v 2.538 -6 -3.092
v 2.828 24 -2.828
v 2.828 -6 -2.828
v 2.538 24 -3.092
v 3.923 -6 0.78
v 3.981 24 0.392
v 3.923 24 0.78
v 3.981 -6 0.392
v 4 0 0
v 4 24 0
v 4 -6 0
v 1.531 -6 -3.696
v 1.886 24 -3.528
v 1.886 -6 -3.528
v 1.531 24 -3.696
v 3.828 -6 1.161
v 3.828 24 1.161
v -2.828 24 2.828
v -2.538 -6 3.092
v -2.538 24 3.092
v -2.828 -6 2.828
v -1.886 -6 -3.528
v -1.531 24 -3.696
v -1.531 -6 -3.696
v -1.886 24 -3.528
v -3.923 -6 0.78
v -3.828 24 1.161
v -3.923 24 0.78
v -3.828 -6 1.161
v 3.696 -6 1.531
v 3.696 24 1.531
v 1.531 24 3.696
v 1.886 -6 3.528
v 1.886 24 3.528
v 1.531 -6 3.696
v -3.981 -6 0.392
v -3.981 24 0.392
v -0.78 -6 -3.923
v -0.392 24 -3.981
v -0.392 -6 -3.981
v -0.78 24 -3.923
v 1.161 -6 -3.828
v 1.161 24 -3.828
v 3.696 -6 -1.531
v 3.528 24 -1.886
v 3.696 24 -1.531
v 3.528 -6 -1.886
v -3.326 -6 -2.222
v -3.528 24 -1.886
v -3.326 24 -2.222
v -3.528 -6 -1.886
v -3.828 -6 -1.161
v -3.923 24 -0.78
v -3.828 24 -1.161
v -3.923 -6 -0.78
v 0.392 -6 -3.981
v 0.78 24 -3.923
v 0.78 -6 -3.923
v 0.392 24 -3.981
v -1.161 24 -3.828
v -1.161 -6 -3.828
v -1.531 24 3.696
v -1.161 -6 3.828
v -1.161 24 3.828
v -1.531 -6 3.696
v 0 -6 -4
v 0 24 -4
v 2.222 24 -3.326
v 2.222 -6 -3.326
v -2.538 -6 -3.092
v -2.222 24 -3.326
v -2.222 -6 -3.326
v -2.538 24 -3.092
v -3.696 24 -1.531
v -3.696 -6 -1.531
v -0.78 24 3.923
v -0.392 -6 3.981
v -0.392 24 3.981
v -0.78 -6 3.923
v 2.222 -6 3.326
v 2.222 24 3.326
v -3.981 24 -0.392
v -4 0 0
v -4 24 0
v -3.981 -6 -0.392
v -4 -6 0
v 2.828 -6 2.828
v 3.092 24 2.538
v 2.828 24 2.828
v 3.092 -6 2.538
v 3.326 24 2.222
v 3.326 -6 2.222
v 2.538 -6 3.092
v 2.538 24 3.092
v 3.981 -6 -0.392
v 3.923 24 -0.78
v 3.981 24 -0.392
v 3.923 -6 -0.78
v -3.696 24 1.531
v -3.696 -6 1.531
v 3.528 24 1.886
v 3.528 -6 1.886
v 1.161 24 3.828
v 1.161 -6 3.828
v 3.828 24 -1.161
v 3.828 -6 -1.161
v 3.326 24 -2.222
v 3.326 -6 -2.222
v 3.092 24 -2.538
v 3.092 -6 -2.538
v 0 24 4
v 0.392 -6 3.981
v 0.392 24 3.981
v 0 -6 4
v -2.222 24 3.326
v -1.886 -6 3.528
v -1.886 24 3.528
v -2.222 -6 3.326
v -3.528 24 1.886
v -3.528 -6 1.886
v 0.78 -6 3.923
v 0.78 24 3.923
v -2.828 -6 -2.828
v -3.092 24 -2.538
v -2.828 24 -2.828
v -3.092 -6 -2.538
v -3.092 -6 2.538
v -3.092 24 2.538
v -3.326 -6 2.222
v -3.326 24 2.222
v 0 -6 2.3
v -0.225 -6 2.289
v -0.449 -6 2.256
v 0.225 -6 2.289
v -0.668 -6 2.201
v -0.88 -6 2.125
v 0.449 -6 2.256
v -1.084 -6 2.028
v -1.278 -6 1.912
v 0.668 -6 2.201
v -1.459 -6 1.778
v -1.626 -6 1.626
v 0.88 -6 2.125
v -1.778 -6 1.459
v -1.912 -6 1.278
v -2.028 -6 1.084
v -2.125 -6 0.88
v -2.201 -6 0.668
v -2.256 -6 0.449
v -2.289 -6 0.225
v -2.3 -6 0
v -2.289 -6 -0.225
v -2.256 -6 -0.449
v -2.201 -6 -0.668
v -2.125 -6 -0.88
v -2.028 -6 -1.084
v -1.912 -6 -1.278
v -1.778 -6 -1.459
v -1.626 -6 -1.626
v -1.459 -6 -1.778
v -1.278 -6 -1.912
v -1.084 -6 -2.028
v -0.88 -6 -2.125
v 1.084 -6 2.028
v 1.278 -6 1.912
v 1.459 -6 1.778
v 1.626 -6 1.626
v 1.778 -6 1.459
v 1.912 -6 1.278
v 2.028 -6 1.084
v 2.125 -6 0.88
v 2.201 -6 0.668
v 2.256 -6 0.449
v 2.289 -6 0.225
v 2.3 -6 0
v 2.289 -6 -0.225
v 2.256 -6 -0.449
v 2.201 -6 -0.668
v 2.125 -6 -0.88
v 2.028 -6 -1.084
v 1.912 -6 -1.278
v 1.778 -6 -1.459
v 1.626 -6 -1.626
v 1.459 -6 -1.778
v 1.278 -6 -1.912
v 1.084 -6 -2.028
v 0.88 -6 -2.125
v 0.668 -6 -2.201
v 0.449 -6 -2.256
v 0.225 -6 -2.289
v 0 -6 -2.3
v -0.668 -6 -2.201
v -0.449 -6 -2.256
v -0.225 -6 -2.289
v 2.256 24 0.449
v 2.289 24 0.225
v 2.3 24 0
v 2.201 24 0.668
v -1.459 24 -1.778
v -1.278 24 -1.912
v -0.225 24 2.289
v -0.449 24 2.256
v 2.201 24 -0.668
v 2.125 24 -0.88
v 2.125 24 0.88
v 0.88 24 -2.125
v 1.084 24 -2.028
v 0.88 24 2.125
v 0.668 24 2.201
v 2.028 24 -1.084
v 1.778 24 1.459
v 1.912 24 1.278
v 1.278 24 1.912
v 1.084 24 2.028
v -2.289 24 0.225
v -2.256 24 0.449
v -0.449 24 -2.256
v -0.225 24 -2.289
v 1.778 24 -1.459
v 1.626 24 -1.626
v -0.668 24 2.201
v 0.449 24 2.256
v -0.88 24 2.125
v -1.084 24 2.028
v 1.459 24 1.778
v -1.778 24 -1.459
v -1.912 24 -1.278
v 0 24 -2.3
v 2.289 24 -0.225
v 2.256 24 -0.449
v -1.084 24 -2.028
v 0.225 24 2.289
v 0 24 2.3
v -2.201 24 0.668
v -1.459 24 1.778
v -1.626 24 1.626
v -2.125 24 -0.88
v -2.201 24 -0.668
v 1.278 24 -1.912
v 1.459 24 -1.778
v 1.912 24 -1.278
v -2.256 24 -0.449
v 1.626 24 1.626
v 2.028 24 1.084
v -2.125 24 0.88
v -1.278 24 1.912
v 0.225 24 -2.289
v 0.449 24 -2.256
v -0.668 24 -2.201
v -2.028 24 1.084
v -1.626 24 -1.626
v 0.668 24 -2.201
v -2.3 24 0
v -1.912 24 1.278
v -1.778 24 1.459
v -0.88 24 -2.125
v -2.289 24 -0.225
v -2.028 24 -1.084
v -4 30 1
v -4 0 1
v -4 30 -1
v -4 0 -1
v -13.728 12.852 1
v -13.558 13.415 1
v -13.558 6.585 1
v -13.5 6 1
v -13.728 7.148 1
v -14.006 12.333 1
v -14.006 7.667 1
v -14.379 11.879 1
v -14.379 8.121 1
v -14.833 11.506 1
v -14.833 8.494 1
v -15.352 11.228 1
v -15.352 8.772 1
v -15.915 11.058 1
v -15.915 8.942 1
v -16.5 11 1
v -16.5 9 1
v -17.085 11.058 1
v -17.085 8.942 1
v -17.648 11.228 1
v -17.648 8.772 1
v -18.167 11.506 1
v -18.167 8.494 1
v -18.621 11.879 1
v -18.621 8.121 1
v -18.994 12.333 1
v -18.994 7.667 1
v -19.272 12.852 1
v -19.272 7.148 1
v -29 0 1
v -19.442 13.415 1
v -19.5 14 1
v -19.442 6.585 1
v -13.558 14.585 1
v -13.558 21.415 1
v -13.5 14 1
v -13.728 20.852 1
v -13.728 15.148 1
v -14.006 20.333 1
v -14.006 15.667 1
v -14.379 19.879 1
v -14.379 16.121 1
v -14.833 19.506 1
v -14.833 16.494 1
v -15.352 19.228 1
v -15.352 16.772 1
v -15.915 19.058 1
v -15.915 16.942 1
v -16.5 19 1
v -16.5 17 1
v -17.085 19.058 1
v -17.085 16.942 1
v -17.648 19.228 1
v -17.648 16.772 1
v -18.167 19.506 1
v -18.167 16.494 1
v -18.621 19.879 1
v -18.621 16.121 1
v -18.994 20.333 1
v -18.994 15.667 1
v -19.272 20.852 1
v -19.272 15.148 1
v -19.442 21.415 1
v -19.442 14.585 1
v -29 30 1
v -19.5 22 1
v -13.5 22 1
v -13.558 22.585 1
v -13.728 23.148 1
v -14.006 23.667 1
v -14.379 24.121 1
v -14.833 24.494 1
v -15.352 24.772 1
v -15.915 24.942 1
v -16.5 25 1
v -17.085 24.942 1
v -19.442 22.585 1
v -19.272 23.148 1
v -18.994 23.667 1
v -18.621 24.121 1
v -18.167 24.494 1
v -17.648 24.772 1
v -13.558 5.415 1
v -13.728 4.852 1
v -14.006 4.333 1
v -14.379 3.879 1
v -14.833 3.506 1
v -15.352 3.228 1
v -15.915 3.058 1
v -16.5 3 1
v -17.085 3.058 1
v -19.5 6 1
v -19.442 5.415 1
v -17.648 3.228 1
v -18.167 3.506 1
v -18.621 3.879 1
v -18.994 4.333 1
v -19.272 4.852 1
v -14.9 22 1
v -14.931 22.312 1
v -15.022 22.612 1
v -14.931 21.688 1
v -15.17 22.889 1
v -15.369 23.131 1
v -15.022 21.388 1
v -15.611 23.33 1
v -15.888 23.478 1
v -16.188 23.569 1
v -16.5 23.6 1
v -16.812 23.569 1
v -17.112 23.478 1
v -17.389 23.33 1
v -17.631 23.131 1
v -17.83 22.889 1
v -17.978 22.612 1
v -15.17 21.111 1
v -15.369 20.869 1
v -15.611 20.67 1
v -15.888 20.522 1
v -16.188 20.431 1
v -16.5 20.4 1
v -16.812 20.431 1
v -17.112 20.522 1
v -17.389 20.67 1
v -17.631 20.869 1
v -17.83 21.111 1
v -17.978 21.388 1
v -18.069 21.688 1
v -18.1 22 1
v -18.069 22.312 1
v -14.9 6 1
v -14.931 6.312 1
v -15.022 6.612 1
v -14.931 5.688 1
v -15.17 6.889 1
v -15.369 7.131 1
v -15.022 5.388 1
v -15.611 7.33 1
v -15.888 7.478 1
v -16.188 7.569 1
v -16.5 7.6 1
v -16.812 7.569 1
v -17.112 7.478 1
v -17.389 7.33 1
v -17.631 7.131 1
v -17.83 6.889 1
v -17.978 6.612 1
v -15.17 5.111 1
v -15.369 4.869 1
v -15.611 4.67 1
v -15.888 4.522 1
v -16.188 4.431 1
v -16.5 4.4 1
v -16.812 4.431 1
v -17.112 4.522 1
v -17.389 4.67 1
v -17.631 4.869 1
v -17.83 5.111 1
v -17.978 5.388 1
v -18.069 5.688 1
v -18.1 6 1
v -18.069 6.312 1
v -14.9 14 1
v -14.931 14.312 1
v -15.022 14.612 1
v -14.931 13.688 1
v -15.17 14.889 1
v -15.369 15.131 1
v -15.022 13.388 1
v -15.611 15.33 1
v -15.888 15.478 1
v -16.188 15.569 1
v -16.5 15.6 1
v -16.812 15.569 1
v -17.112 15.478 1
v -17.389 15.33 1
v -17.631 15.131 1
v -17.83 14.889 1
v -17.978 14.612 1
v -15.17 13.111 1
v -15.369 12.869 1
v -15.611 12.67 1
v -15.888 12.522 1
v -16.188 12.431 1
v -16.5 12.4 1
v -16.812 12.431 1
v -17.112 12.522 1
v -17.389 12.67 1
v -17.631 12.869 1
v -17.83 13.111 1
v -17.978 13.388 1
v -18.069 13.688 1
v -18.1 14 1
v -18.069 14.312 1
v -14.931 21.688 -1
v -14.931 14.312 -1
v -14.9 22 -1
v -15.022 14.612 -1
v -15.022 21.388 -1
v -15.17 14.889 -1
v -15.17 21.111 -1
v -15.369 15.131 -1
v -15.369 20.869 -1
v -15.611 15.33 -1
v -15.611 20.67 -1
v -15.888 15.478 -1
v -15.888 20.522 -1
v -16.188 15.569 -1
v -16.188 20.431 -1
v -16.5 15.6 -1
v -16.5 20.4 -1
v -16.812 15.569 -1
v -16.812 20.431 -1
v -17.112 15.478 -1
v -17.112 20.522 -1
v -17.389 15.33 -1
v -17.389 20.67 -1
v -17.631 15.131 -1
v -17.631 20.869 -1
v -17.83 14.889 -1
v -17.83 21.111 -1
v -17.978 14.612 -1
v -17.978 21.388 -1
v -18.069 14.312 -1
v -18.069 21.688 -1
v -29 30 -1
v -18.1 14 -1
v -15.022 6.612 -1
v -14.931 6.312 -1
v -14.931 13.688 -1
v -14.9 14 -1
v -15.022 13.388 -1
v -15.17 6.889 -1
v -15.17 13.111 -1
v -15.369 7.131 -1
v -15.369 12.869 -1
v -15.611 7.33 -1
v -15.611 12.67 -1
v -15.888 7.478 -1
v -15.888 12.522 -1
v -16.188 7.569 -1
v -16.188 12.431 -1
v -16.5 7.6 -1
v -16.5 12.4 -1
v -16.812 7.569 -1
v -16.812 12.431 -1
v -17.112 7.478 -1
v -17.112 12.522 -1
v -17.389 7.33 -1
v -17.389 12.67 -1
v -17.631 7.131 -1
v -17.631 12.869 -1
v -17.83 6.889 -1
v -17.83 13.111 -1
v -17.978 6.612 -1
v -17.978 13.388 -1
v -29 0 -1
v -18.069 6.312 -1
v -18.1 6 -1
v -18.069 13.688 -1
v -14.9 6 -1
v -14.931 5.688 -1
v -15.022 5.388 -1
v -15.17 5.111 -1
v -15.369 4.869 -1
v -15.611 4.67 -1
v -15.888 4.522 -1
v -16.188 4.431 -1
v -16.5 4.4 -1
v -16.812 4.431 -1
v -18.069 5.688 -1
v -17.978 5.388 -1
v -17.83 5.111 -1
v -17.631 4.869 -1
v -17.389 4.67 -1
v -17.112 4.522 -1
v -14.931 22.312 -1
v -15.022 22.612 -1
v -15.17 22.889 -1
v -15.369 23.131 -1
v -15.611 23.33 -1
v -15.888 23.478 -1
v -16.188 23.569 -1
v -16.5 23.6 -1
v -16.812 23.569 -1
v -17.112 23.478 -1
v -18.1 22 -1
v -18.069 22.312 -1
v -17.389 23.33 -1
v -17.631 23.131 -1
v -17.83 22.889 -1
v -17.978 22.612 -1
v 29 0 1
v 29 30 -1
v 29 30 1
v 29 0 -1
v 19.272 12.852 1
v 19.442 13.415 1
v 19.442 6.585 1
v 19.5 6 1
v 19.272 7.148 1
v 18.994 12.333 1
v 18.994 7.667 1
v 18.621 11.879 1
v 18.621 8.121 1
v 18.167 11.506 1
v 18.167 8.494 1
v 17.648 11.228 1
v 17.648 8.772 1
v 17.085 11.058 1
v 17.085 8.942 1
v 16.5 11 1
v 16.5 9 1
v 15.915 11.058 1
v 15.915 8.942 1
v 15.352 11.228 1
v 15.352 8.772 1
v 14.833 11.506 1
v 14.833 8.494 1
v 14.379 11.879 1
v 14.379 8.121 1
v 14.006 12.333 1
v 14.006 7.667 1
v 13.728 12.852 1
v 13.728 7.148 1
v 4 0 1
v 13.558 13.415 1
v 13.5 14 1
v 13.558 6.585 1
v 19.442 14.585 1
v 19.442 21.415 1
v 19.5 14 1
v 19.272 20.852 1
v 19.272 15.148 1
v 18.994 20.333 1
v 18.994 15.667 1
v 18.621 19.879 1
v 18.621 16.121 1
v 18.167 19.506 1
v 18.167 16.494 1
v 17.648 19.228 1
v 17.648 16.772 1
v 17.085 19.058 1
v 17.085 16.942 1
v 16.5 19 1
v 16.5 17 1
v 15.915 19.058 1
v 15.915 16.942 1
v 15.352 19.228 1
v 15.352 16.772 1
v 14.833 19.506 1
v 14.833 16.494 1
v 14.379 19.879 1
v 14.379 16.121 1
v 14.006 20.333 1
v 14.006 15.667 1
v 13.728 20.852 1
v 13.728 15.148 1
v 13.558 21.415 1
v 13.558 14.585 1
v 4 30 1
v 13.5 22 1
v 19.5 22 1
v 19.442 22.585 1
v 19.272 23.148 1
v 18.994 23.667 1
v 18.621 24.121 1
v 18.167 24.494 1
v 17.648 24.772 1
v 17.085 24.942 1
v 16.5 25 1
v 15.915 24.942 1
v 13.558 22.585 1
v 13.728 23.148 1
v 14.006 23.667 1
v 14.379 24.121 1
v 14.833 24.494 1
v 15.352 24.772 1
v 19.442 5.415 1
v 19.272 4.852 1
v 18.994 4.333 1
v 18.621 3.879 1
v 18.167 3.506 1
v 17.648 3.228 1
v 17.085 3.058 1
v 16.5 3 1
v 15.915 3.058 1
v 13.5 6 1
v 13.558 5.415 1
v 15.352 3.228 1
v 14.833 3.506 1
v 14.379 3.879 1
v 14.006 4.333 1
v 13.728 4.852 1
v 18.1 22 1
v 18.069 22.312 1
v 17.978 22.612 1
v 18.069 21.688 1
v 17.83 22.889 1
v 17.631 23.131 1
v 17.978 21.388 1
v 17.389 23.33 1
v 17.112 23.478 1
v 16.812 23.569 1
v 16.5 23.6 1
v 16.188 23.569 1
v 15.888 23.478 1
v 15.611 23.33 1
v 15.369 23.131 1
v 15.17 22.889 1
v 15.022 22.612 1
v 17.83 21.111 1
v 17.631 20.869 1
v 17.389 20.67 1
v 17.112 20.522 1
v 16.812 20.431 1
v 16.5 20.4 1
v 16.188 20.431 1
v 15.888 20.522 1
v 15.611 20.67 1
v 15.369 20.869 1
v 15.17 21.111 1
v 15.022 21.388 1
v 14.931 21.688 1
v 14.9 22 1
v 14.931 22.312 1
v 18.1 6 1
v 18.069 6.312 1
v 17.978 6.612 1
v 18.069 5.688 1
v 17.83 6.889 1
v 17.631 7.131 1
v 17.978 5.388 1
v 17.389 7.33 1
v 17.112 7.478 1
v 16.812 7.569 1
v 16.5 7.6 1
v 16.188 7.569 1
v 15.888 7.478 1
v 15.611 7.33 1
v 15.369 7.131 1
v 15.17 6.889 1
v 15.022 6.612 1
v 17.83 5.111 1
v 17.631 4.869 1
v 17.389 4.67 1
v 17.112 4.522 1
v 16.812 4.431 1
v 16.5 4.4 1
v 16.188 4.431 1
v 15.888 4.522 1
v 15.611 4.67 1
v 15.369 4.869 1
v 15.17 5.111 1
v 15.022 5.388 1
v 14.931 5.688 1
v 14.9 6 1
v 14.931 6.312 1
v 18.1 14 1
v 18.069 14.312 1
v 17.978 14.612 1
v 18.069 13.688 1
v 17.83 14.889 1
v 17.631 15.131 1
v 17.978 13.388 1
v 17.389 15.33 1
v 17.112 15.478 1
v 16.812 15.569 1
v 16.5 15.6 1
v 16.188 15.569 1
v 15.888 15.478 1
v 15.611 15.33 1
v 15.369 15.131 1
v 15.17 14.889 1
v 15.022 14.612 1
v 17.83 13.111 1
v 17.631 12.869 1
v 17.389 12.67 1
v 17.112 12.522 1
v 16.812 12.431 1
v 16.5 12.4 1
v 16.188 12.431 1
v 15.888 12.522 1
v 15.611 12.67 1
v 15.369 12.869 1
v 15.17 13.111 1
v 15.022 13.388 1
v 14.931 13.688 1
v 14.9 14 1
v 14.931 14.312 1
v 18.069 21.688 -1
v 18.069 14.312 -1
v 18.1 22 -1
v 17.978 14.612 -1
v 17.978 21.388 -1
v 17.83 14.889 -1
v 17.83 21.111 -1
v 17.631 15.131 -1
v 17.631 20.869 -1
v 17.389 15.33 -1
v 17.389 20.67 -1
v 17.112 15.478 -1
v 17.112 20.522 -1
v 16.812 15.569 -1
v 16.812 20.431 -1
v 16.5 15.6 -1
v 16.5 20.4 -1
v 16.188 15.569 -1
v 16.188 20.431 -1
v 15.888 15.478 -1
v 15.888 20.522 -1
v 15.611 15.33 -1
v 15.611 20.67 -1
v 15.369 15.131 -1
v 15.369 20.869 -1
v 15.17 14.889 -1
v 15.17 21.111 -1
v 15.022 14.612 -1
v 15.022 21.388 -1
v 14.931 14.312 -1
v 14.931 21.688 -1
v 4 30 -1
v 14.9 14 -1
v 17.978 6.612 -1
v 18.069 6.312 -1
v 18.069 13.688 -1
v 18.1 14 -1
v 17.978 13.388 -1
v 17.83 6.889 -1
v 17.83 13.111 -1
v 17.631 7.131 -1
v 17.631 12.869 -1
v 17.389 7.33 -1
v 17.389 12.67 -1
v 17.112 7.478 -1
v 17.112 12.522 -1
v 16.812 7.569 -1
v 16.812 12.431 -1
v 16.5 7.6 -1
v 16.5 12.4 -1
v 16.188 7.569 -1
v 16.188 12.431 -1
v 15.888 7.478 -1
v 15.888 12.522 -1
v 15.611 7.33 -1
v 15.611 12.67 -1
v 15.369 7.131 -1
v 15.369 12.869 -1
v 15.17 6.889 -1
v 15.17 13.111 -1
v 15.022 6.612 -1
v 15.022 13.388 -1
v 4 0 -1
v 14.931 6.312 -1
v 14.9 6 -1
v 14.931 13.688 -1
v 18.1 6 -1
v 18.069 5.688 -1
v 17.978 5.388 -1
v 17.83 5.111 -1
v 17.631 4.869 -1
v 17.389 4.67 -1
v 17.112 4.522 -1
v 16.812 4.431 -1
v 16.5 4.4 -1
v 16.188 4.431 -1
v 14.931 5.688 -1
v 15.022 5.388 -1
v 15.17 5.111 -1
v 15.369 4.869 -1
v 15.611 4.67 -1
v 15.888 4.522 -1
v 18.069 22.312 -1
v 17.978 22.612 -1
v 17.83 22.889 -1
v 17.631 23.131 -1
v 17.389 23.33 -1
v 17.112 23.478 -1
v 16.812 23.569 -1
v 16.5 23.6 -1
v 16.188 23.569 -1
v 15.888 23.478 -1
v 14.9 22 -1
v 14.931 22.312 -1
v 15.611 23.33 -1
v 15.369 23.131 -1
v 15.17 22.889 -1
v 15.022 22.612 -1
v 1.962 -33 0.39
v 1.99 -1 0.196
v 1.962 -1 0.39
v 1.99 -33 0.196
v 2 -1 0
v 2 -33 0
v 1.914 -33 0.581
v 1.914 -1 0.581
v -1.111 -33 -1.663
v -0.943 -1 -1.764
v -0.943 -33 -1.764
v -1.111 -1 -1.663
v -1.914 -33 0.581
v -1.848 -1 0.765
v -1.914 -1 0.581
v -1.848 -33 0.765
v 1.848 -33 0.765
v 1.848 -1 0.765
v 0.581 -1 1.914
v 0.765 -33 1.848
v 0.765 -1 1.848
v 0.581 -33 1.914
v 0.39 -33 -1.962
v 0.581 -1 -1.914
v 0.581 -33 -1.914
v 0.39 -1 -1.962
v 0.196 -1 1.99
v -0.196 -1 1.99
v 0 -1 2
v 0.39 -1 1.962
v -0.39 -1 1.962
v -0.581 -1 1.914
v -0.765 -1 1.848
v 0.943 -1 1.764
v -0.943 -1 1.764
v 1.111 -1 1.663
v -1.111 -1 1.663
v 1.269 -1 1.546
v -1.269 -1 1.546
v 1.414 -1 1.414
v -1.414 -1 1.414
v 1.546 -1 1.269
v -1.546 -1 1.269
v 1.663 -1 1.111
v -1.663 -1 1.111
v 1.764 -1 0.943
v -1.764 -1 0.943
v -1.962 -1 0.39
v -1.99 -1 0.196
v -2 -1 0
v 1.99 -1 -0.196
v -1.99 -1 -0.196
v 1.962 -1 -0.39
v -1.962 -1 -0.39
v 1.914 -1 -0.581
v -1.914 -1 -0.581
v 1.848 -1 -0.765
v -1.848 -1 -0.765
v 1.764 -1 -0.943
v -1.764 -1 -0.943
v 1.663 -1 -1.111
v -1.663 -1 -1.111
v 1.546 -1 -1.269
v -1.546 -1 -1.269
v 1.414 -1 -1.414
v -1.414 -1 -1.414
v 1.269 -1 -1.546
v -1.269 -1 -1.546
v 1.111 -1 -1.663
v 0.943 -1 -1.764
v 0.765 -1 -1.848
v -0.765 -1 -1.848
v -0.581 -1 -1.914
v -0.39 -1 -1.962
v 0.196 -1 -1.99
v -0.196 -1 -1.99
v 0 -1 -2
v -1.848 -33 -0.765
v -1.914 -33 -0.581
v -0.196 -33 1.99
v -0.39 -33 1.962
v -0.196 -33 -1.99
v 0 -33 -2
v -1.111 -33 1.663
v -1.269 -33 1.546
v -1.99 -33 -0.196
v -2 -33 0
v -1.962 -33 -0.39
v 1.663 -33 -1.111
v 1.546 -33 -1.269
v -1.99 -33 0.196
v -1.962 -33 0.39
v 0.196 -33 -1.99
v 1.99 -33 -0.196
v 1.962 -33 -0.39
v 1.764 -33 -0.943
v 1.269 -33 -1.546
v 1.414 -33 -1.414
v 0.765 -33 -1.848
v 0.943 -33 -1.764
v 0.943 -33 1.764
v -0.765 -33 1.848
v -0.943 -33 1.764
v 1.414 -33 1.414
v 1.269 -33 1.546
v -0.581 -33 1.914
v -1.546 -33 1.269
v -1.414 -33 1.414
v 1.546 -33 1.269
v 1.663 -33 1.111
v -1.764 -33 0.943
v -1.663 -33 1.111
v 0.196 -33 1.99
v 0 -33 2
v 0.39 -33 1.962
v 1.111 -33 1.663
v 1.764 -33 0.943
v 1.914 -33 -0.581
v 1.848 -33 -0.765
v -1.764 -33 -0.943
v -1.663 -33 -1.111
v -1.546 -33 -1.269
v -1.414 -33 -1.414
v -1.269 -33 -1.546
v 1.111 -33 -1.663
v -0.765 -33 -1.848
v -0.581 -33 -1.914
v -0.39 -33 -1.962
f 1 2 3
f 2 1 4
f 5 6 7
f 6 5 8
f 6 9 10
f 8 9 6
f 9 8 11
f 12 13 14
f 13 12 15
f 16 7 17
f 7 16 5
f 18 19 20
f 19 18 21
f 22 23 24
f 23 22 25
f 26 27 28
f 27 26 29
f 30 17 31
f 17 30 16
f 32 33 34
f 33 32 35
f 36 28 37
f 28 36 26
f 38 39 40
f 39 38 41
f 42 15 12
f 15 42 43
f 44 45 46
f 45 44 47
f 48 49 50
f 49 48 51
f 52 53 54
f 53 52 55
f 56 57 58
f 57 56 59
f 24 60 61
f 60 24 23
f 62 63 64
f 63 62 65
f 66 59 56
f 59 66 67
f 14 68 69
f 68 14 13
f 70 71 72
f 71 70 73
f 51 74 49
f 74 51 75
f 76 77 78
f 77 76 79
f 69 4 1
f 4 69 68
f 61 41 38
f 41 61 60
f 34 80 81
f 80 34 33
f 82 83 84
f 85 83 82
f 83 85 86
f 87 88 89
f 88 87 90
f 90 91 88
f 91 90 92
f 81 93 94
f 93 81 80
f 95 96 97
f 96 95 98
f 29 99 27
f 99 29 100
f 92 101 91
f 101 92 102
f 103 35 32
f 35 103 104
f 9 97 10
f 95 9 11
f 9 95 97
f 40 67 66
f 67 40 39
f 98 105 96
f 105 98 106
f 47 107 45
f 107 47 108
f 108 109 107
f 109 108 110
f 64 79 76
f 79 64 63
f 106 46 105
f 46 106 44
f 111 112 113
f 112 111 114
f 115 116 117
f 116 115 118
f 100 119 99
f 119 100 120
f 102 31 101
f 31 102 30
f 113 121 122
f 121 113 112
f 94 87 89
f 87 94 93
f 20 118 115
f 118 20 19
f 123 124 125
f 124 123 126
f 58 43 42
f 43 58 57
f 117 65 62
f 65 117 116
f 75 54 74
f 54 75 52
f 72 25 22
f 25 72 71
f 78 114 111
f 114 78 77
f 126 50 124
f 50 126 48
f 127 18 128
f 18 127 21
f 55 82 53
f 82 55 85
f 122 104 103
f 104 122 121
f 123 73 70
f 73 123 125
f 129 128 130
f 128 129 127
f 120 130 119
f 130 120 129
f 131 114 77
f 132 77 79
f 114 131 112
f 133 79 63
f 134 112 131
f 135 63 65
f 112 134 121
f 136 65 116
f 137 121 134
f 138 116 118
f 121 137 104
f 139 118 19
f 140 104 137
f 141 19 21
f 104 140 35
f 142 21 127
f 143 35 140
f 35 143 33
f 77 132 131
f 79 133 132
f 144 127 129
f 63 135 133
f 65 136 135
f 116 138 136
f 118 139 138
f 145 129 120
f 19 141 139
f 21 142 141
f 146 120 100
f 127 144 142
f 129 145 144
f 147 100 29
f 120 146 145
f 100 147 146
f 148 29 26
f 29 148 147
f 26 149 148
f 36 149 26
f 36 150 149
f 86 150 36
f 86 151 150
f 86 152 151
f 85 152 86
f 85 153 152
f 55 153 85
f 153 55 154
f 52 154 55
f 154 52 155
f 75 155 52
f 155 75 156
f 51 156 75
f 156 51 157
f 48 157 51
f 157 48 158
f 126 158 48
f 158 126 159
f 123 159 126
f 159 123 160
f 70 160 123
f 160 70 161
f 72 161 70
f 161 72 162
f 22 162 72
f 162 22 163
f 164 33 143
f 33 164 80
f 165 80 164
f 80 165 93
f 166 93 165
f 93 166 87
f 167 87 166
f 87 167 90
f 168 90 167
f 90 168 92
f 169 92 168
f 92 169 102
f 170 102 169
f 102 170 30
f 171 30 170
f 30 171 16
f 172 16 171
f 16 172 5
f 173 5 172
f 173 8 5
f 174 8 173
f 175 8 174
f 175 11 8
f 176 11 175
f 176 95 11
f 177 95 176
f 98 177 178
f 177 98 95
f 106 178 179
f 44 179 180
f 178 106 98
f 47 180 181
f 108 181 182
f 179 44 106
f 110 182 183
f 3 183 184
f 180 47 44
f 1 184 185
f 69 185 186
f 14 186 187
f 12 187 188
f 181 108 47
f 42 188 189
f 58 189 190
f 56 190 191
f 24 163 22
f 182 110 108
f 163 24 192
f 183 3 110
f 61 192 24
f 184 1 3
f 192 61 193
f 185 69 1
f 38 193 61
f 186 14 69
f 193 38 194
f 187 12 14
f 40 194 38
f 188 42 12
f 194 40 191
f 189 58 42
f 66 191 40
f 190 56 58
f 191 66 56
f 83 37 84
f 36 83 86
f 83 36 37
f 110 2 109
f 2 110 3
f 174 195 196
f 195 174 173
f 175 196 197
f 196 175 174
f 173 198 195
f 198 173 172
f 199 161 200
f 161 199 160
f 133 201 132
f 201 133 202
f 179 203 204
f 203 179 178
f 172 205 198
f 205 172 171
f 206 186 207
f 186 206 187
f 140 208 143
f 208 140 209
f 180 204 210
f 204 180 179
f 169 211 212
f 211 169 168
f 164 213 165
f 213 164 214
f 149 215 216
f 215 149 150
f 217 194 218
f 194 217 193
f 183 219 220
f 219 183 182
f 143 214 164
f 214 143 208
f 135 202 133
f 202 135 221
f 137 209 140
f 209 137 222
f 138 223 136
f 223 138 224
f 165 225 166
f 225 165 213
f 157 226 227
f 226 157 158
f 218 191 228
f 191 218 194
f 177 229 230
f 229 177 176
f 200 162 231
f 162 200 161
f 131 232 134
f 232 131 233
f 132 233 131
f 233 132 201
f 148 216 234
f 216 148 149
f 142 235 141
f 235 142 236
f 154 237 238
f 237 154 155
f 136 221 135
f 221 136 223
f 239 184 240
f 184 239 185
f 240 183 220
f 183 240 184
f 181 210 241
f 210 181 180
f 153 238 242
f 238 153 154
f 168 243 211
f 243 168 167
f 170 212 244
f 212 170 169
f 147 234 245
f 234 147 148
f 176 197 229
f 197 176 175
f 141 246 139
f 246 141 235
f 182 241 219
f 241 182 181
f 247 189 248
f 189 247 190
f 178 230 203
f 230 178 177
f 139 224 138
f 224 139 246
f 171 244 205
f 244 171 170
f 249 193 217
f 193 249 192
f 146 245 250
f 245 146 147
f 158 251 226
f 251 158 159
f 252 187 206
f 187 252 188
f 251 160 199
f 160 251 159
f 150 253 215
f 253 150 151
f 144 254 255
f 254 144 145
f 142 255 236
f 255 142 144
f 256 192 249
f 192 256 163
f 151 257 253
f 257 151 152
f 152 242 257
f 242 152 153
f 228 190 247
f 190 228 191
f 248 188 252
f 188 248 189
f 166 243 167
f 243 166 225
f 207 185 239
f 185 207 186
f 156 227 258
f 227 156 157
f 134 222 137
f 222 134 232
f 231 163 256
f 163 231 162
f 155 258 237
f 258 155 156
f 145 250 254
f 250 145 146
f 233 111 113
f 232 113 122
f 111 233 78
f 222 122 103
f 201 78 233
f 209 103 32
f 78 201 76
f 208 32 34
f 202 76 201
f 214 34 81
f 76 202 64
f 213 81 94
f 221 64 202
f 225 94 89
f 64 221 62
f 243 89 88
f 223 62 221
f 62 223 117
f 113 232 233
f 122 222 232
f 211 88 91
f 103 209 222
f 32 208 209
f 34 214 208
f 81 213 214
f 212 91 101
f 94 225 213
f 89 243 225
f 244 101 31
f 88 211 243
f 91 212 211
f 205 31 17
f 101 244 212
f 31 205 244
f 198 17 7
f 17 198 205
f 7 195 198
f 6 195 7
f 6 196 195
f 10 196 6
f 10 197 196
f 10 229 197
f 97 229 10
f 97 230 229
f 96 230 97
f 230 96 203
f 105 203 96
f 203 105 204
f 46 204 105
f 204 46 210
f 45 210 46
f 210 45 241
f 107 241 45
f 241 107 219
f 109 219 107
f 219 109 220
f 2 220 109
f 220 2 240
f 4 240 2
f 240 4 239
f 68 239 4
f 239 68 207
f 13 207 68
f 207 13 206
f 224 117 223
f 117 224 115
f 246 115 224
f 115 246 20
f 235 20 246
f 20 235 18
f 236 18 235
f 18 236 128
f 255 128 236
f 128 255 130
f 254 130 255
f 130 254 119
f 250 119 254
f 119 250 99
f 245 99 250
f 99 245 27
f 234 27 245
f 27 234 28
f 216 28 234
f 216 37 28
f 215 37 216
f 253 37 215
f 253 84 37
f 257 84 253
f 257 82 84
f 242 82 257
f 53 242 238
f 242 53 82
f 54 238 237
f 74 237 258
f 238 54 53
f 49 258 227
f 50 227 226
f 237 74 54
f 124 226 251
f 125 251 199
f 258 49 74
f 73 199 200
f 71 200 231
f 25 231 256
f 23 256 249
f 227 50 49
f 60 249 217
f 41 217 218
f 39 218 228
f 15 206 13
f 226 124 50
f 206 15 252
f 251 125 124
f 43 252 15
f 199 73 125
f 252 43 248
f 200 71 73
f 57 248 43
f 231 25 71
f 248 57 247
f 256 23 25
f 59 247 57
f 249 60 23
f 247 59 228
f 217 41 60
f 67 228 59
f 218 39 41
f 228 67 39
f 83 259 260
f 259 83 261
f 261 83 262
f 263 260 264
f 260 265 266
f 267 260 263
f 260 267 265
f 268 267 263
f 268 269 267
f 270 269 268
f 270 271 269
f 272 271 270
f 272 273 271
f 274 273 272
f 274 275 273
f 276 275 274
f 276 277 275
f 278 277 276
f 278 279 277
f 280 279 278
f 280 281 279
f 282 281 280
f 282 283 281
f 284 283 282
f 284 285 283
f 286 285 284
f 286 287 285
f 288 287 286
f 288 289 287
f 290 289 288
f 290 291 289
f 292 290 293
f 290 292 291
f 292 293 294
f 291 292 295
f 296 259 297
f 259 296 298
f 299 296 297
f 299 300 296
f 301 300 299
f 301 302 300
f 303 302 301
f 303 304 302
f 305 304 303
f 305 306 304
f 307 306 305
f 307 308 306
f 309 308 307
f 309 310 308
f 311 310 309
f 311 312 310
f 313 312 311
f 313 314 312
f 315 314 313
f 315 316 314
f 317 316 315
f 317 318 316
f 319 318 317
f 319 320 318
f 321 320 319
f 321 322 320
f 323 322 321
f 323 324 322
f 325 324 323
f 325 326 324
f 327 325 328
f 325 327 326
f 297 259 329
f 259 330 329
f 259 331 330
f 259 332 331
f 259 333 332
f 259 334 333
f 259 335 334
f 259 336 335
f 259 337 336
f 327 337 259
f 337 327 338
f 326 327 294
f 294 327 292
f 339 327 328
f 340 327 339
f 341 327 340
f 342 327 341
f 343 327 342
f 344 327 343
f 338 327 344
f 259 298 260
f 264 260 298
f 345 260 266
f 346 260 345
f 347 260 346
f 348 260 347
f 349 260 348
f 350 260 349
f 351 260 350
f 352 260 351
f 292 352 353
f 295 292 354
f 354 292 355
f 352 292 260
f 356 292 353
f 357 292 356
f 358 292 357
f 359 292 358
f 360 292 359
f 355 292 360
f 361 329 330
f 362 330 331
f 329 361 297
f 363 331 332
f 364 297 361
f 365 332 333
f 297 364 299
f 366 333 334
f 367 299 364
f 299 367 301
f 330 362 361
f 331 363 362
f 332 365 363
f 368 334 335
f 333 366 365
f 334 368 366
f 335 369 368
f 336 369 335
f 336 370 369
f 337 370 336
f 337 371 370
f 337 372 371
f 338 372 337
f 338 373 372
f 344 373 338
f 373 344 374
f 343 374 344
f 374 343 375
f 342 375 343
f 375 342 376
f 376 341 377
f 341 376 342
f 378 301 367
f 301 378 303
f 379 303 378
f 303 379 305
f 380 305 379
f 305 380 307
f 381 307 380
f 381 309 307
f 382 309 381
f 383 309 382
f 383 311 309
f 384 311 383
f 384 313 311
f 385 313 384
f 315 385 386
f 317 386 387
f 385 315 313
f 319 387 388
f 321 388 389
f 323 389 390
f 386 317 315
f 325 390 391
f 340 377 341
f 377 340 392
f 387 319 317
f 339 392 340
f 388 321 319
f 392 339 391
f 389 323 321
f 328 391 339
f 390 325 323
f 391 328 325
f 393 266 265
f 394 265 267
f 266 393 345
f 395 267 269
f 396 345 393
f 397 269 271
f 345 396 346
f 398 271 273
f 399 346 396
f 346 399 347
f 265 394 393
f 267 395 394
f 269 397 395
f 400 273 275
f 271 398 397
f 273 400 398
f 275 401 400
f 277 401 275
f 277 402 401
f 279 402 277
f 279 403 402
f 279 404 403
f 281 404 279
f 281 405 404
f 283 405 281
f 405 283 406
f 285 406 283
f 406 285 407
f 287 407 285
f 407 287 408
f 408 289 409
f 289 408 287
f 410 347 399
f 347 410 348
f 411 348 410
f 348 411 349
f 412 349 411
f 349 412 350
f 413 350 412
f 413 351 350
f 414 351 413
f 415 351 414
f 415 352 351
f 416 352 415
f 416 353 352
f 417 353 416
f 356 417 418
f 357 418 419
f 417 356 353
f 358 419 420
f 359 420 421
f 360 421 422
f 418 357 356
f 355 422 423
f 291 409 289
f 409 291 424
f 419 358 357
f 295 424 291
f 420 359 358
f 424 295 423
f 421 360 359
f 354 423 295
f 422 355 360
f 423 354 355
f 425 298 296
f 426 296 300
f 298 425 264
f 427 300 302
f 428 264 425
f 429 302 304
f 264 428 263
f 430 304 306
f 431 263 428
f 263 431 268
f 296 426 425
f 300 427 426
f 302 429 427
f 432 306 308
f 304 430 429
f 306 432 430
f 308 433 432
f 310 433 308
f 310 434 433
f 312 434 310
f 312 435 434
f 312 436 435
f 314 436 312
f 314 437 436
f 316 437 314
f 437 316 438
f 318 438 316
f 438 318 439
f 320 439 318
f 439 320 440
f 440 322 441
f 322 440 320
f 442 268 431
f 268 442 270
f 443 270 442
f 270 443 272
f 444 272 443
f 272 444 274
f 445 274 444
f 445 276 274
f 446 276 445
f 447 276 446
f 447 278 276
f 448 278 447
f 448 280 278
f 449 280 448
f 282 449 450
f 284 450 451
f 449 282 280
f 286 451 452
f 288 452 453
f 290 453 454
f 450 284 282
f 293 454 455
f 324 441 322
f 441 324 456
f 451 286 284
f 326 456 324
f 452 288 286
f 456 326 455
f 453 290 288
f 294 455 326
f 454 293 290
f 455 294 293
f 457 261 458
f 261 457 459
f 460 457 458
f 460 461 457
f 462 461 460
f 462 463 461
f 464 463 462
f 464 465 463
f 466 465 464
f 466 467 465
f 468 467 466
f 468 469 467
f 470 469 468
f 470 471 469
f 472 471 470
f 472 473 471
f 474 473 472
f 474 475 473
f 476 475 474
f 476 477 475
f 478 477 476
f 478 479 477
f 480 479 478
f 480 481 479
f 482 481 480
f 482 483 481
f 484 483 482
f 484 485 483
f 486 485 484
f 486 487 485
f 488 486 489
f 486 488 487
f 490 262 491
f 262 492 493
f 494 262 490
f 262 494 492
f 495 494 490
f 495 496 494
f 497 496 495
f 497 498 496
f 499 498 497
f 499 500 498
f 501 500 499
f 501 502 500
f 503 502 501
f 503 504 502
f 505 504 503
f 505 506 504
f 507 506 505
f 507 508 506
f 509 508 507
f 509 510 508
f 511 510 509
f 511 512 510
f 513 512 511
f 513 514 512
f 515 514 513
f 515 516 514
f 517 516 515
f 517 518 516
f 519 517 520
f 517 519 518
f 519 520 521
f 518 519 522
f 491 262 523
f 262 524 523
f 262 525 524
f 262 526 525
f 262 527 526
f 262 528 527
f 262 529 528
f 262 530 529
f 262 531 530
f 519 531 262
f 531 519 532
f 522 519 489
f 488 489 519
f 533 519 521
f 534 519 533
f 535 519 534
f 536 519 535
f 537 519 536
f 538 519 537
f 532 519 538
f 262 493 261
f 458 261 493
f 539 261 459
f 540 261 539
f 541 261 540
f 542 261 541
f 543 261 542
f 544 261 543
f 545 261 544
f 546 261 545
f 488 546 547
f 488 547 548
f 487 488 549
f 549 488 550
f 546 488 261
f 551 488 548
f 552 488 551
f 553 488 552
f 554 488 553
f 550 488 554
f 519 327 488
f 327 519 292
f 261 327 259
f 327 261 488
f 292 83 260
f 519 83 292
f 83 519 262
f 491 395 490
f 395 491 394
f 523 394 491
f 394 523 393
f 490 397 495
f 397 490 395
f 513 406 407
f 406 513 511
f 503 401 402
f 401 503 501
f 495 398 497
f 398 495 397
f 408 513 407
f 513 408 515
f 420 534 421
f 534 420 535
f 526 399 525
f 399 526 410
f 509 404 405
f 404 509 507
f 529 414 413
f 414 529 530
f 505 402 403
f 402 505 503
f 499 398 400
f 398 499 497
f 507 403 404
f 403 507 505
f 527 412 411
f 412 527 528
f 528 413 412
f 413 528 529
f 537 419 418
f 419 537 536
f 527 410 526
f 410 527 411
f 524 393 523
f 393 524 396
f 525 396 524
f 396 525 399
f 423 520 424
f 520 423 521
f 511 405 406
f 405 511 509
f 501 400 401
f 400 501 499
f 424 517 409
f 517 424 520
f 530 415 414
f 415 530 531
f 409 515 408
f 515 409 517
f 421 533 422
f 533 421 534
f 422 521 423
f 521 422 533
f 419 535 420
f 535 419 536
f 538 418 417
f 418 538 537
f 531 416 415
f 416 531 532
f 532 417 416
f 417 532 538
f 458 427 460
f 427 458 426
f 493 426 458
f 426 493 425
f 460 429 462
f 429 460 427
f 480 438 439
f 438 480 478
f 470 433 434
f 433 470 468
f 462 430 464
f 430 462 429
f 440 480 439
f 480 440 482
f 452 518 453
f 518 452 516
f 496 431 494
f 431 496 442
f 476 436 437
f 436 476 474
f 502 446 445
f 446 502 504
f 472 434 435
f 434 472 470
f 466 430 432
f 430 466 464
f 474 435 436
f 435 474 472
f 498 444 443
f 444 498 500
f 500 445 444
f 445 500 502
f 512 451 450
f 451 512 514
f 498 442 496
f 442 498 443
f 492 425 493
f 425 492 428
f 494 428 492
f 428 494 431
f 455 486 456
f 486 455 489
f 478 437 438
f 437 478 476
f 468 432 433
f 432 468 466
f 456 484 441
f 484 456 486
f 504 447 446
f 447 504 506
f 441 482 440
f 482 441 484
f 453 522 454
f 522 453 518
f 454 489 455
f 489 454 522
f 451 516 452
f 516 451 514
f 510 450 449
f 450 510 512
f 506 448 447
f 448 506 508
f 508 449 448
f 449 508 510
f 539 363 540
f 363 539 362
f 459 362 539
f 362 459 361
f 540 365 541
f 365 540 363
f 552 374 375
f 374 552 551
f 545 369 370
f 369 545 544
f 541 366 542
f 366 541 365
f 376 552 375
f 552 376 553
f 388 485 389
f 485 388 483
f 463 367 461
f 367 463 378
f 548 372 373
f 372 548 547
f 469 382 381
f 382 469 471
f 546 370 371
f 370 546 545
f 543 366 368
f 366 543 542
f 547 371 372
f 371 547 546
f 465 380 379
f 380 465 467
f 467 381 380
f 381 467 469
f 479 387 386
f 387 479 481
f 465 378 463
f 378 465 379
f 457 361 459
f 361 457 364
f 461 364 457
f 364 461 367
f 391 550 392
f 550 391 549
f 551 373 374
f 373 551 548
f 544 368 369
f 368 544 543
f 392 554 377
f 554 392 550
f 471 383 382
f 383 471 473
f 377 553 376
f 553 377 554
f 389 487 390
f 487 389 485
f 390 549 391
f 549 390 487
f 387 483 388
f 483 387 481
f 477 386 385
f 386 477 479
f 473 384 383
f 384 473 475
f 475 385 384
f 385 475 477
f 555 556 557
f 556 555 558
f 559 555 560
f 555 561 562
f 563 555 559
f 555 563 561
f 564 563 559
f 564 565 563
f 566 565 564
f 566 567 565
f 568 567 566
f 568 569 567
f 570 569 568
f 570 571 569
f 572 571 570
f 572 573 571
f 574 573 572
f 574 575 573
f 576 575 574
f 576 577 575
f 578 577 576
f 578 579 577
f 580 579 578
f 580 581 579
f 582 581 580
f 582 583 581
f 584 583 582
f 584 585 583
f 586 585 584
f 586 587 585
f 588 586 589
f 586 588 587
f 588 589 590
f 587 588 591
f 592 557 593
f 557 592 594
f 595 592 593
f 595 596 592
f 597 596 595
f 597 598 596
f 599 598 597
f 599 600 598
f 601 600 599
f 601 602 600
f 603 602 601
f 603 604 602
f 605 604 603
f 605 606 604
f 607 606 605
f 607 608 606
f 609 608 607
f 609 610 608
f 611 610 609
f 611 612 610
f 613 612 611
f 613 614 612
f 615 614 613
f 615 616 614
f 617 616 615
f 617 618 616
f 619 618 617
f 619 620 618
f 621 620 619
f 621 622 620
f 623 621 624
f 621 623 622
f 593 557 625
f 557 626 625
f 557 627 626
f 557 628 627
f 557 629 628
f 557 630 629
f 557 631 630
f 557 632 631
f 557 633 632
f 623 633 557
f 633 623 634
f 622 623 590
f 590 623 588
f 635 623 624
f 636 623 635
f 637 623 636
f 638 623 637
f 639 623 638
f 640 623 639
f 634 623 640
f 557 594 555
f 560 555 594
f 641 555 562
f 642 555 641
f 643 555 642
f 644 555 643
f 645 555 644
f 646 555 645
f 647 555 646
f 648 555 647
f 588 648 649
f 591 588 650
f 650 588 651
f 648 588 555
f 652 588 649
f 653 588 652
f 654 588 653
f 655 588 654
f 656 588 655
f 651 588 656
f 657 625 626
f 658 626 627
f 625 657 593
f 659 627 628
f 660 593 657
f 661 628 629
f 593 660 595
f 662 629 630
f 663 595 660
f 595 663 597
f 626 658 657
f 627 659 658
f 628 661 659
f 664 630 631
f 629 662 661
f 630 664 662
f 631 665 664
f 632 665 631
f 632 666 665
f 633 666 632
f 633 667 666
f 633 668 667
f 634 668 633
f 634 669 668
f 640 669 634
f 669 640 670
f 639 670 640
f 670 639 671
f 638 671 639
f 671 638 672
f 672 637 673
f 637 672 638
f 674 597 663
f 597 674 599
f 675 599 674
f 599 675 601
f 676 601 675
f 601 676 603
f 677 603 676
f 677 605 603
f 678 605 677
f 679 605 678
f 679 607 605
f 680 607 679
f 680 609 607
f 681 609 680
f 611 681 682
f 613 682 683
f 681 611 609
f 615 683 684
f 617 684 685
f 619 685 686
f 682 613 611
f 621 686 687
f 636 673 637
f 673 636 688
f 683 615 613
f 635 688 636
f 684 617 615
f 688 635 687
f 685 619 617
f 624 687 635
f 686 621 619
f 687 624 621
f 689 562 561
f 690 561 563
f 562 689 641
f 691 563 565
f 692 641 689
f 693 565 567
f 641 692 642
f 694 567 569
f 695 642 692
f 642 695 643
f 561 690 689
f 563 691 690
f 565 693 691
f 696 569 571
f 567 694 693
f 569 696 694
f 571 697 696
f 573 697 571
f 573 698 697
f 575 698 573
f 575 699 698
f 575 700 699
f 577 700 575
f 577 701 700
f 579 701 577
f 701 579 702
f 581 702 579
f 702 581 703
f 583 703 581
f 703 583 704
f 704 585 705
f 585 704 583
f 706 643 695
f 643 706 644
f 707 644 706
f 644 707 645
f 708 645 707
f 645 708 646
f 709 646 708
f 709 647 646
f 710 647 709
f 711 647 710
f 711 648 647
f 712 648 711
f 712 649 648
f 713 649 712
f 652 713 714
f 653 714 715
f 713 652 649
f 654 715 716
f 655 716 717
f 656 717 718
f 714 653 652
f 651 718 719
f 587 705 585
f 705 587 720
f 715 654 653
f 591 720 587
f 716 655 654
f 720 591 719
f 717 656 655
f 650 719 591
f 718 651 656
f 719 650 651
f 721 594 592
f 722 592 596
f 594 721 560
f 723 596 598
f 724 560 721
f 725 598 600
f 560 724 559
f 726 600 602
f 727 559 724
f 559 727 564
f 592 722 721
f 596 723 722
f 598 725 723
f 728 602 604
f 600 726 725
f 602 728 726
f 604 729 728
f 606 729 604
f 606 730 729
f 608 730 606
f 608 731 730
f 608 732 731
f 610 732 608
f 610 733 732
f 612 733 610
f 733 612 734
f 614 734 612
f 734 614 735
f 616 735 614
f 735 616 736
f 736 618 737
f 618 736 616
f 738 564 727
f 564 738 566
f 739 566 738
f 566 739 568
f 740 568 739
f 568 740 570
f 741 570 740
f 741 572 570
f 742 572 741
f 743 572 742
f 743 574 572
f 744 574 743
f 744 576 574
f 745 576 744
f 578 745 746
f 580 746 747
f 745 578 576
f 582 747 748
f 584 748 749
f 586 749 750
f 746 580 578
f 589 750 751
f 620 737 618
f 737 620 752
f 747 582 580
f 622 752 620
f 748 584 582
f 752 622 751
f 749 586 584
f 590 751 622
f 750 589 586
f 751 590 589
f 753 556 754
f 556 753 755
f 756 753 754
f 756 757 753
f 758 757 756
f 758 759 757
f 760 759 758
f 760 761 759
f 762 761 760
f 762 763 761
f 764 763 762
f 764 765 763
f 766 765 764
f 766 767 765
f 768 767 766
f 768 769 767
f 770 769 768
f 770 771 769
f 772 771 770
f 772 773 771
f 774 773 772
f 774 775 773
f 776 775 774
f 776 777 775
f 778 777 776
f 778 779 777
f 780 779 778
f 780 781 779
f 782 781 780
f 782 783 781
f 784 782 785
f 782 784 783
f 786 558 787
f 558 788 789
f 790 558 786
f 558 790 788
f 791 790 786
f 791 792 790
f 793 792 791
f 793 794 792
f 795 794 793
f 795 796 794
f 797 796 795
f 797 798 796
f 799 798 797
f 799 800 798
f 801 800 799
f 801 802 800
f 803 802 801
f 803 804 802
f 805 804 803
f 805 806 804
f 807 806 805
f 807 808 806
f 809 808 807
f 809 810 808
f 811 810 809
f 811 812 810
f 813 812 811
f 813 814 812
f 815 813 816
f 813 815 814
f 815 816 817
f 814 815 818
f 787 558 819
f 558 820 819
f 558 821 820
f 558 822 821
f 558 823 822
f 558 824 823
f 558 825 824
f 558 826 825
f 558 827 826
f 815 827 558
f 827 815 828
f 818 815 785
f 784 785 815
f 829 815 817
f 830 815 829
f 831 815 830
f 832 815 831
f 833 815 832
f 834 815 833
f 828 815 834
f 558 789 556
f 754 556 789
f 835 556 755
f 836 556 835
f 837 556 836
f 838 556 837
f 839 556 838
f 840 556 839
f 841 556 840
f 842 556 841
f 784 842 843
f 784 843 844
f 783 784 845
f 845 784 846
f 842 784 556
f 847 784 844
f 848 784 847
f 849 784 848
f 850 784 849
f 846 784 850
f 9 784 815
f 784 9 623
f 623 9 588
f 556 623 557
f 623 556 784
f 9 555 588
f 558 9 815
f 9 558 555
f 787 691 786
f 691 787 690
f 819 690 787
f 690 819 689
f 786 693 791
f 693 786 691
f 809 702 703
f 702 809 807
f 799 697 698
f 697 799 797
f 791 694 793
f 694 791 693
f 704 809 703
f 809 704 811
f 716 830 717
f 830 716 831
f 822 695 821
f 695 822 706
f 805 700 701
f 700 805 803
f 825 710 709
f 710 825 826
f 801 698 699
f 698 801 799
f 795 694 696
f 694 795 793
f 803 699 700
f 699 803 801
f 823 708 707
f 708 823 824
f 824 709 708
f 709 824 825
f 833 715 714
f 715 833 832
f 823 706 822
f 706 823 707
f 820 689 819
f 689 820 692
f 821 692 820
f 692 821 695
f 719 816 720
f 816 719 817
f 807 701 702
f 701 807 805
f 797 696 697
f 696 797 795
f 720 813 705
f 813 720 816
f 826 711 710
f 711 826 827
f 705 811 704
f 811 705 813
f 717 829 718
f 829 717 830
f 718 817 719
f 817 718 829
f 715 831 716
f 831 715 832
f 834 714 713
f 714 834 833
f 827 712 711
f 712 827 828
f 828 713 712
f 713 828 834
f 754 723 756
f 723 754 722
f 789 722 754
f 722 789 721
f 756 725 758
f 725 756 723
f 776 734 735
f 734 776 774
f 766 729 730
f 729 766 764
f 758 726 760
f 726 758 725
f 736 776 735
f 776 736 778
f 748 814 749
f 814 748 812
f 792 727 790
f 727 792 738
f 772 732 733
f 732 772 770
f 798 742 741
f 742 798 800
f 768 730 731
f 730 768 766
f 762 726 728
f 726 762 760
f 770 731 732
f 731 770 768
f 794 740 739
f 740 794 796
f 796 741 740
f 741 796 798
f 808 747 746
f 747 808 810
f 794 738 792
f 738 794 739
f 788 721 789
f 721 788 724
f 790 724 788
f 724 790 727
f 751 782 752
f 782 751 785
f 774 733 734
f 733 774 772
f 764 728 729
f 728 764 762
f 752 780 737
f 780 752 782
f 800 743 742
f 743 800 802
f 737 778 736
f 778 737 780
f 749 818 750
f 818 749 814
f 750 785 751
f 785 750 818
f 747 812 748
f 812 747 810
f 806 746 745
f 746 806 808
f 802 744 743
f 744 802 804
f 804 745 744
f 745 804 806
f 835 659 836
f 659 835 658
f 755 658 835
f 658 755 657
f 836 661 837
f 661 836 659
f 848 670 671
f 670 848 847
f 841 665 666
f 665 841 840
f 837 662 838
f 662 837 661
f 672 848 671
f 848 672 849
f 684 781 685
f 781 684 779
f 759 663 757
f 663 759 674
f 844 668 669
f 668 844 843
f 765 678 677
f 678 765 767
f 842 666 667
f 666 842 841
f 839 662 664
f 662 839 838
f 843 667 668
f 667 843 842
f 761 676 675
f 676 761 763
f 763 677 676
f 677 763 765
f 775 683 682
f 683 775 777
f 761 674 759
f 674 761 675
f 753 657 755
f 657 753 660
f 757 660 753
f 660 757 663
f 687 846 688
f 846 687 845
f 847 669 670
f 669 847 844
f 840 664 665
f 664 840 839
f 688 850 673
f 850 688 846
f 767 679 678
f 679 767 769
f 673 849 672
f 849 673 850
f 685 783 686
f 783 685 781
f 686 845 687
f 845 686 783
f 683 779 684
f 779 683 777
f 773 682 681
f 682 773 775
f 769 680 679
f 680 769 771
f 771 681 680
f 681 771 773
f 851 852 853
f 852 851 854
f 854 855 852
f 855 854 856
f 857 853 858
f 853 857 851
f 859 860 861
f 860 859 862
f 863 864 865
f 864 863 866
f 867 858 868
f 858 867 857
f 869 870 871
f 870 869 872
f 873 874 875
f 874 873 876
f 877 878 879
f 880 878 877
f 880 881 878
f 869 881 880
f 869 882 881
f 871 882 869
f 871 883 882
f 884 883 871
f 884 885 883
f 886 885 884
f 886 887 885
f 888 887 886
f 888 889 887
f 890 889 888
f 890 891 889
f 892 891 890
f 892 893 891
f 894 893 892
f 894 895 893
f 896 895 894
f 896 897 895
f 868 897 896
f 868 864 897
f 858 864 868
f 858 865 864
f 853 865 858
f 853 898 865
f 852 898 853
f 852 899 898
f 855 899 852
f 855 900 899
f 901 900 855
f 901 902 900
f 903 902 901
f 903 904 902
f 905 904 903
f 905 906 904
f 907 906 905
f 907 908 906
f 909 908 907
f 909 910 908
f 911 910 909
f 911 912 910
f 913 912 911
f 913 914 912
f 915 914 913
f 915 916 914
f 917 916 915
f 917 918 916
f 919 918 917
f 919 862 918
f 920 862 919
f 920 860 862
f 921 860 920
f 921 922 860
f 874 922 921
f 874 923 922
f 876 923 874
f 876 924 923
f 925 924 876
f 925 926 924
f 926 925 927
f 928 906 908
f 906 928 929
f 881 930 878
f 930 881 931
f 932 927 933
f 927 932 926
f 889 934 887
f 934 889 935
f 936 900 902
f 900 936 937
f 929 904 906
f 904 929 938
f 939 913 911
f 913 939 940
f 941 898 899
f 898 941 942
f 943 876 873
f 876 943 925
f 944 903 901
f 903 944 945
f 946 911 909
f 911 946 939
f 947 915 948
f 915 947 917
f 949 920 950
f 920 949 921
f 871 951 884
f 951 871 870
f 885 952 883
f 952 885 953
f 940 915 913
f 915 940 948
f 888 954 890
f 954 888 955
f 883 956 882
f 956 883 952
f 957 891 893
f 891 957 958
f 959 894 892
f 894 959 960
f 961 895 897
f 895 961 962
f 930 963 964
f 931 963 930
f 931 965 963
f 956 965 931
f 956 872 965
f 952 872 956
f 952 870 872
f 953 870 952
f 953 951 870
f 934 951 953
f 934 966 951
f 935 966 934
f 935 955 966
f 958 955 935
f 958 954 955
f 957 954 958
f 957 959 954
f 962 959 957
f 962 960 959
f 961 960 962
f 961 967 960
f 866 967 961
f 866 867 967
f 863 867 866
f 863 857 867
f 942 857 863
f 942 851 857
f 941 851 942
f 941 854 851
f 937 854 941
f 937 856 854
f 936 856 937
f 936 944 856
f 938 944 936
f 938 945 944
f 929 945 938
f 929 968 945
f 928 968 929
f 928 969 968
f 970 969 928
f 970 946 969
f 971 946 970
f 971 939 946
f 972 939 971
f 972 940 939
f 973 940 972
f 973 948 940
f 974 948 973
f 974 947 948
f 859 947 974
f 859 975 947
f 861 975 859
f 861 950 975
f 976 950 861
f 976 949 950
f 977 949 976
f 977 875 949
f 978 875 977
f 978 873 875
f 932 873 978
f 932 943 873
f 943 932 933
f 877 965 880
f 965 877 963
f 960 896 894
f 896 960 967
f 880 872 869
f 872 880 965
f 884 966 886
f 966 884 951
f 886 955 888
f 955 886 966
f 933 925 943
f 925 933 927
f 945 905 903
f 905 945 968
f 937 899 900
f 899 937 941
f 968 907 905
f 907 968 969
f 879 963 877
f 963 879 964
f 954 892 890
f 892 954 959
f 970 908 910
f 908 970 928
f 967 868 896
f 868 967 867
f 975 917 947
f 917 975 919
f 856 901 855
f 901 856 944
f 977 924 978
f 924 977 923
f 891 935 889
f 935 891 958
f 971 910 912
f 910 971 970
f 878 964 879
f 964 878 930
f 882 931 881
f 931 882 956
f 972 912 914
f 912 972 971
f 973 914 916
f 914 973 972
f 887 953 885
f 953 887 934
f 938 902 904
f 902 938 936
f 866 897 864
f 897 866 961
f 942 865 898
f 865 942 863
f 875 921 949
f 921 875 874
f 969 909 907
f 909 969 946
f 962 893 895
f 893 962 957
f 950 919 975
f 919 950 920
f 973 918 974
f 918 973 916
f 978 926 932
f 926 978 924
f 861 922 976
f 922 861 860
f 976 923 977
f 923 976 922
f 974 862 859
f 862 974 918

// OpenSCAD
// Butt hinge (opened 180°)
// Parameters
plate_len = 30;           // along Y
plate_w   = 25;           // along X (each leaf)
plate_t   = 2;            // thickness (Z)
kn_seg    = 6;            // single knuckle length
kn_count  = 5;            // total knuckle pieces
kn_od     = 8;            // knuckle outer Ø
kn_id     = 4.6;          // knuckle inner Ø (pin clearance)
pin_d     = 4;            // pin Ø
pin_len   = plate_len+2;  // 32 mm (30 + 1 + 1)

// Convenience
$fn = 64;

// ---------- Modules ----------
module cyl_y(h,r,center=false)
    rotate([90,0,0]) cylinder(h=h,r=r,center=center);

module knuckle_seg(len=kn_seg, od=kn_od/2, id=kn_id/2)
difference(){
    cyl_y(len, od);
    cyl_y(len+0.2, id);     // a bit longer for clean subtraction
}

module countersunk_hole()
union(){
    translate([0,0,-2]) cylinder(h=6,r=3.2/2,$fn=32);   // through M3.2
    translate([0,0,0])  cylinder(h=1,r=6/2,$fn=32);     // 6 mm Ø, 1 mm deep
}

module leaf(is_left=true){
    // X positions
    plate_x = is_left ? -(kn_od/2) - plate_w :  kn_od/2;
    hole_x  = is_left ? -(kn_od/2) - plate_w/2 : kn_od/2 + plate_w/2;

    difference(){
        // Solid parts
        union(){
            // plate
            translate([plate_x,0,-plate_t/2])
                cube([plate_w, plate_len, plate_t]);

            // knuckles
            if(is_left){
                for(i=[0,2,4])
                    translate([0,i*kn_seg,0]) knuckle_seg();
            }else{
                for(i=[1,3])
                    translate([0,i*kn_seg,0]) knuckle_seg();
            }
        }

        // screw holes (Y positions 6 mm, 14 mm, 22 mm from one end)
        for(y=[6,14,22])
            translate([hole_x,y,plate_t/2])
                countersunk_hole();
    }
}

module pin(){
    translate([0,-1,0]) cyl_y(pin_len, pin_d/2, false);
}

// ---------- Assembly ----------
union(){
    leaf(true);   // left leaf
    leaf(false);  // right leaf
    pin();        // hinge pin
}
